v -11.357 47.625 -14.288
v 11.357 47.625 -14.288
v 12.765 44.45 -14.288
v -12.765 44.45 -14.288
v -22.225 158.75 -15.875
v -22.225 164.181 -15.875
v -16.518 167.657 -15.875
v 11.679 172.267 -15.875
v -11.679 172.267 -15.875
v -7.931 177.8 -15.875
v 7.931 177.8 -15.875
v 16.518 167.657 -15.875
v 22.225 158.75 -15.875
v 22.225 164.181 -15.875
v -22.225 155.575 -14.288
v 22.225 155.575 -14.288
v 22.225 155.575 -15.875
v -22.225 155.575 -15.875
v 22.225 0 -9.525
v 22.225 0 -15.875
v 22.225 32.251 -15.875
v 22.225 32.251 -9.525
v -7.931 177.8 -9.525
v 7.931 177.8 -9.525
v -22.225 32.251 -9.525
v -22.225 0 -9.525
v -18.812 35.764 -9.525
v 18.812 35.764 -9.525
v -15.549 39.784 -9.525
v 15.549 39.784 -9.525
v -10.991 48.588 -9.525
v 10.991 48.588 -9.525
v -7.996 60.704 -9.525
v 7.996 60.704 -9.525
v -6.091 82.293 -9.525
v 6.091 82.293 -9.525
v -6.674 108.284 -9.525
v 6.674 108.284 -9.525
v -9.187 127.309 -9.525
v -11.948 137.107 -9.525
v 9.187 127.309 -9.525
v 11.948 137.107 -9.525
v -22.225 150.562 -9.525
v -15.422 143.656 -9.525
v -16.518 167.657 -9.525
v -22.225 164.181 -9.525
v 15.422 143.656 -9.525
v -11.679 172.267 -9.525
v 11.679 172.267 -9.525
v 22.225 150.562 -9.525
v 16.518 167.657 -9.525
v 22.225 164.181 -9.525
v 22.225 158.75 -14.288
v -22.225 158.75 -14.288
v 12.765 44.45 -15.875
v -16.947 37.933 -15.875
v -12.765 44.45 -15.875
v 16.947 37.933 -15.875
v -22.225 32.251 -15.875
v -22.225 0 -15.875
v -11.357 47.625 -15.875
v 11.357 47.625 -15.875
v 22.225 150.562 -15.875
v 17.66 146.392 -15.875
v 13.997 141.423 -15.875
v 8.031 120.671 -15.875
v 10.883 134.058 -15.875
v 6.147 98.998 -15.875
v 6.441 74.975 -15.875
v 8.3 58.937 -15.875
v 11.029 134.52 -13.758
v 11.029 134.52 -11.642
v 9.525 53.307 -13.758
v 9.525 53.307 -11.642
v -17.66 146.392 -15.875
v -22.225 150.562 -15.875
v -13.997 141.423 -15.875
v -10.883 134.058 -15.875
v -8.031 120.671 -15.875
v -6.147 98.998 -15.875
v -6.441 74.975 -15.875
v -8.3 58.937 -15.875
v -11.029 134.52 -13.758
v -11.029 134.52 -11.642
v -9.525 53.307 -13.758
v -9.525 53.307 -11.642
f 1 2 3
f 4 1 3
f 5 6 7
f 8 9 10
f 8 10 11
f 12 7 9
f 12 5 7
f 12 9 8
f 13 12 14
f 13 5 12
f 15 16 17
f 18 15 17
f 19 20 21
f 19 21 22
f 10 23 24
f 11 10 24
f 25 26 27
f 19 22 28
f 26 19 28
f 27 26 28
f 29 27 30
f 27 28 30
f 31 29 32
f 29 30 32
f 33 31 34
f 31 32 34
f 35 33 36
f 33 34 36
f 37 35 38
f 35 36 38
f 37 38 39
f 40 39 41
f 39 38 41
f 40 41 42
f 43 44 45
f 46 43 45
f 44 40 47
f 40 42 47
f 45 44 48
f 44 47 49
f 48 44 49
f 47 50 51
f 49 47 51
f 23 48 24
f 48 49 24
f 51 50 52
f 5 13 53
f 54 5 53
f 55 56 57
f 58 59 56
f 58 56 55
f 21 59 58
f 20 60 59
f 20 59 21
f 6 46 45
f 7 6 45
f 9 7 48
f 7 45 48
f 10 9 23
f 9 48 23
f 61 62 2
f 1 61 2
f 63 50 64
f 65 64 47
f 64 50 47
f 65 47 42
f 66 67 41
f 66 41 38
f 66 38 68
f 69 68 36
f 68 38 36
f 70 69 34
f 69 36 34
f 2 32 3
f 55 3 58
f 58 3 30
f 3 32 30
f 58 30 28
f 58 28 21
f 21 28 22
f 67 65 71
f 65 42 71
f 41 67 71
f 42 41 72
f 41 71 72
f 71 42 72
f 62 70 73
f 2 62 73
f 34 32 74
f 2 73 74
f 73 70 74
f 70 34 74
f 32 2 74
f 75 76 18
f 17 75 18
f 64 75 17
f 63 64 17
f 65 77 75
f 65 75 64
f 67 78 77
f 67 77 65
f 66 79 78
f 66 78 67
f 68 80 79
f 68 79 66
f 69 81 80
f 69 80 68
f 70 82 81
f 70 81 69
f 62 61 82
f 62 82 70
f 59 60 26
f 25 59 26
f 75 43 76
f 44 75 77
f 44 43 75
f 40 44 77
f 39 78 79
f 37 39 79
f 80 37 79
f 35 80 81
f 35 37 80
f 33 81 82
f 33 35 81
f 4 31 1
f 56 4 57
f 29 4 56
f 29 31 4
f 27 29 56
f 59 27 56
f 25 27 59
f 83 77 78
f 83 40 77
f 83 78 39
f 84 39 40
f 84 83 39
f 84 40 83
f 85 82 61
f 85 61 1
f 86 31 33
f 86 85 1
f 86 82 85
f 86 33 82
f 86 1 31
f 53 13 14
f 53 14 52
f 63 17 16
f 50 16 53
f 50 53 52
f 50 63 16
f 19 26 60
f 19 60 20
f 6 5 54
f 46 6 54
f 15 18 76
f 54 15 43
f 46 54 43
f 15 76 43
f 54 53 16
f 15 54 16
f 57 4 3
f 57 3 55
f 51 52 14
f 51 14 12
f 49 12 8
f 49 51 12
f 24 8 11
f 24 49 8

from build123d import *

# Parameters (mm, degrees)
F0_W     = 44.45
F0_H     = 31.75
F1_DEPTH = 177.8
F3_DEPTH = 44.451
F4_W     = 177.8
F4_H     = 25.4
F5_DEPTH = 66.04
F7_DEPTH = 25.4
F9_DEPTH = 25.4


# Not quite as in the source:
# - a pattern or mirror of a feature is missing from the dataset's text; its kind, count and spacing are read off the source's solid


with BuildPart() as f1:
    # F0 (on Front) → F1 (new body)
    with BuildSketch(Plane.XZ):
        Rectangle(F0_W, F0_H)
    extrude(amount=-F1_DEPTH)

    # F2 (on face) → F3 (cut, through all)
    with BuildSketch(Plane.YZ.offset(22.225)):
        with BuildLine():
            ThreePointArc((46.0375, -14.2875), (44.9149679849, -14.7524679849), (44.45, -15.875))
            Line((44.45, -15.875), (47.625, -15.875))
            ThreePointArc((47.625, -15.875), (47.1600320151, -14.7524679849), (46.0375, -14.2875))
        make_face()
        with BuildLine():
            ThreePointArc((46.0375, -14.2875), (47.1600320151, -14.7524679849), (47.625, -15.875))
            Line((47.625, -15.875), (47.625, -14.2875))
            Line((47.625, -14.2875), (46.0375, -14.2875))
        make_face()
        with BuildLine():
            Line((44.45, -14.2875), (44.45, -15.875))
            ThreePointArc((44.45, -15.875), (44.9149679849, -14.7524679849), (46.0375, -14.2875))
            Line((46.0375, -14.2875), (44.45, -14.2875))
        make_face()
        with BuildLine():
            ThreePointArc((157.1625, -14.2875), (156.0399679849, -14.7524679849), (155.575, -15.875))
            Line((155.575, -15.875), (158.75, -15.875))
            ThreePointArc((158.75, -15.875), (158.2850320151, -14.7524679849), (157.1625, -14.2875))
        make_face()
        with BuildLine():
            ThreePointArc((157.1625, -14.2875), (158.2850320151, -14.7524679849), (158.75, -15.875))
            Line((158.75, -15.875), (158.75, -14.2875))
            Line((158.75, -14.2875), (157.1625, -14.2875))
        make_face()
        with BuildLine():
            Line((155.575, -14.2875), (155.575, -15.875))
            ThreePointArc((155.575, -15.875), (156.0399679849, -14.7524679849), (157.1625, -14.2875))
            Line((157.1625, -14.2875), (155.575, -14.2875))
        make_face()
    extrude(amount=-F3_DEPTH, mode=Mode.SUBTRACT)

    # F4 (on face) → F5 (cut)
    with BuildSketch(Plane.YZ.offset(22.225)):
        with Locations((88.9, 3.175)):
            Rectangle(F4_W, F4_H)
    extrude(amount=-F5_DEPTH, mode=Mode.SUBTRACT)

    # F6 (on face) → F7 (cut)
    with BuildSketch(Plane.XY.offset(-9.525)):
        with BuildLine():
            add(Edge.make_bspline(
                [(-22.225, 150.5618393421), (-18.0890147105, 147.097734562), (-5.5252210375, 136.5748978803), (-3.6345620333, 50.7939916857), (-17.3552404375, 37.108562276), (-22.225, 32.2513133287)],
                knots=[0, 0, 0, 0, 0.2404536555, 0.7304209045, 1, 1, 1, 1], degree=3))
            Line((-22.225, 150.5618393421), (-22.225, 32.2513133287))
        make_face()
        with BuildLine():
            Line((22.225, 32.2513133287), (22.225, 150.5618393421))
            add(Edge.make_bspline(
                [(22.225, 150.5618393421), (18.0890147105, 147.097734562), (5.5252210375, 136.5748978803), (3.6345620333, 50.7939916857), (17.3552404375, 37.108562276), (22.225, 32.2513133287)],
                knots=[0, 0, 0, 0, 0.2404536555, 0.7304209045, 1, 1, 1, 1], degree=3))
        make_face()
    extrude(amount=-F7_DEPTH, mode=Mode.SUBTRACT)

    # F8 (on face) → F9 (cut)
    with BuildSketch(Plane.XY.offset(-9.525)):
        with BuildLine():
            Line((-22.225, 177.8), (-22.225, 164.1809196711))
            ThreePointArc((-22.225, 164.1809196711), (-13.9748413511, 169.8326284901), (-7.9310080037, 177.8))
            Line((-7.9310080037, 177.8), (-22.225, 177.8))
        make_face()
    f9 = extrude(amount=-F9_DEPTH, mode=Mode.SUBTRACT)

    # F9_copies: F9 across plane
    add(f9.mirror(Plane(origin=(0, 0, 0), x_dir=(0, 0, 1), z_dir=(1, 0, 0))), mode=Mode.SUBTRACT)


solid = f1.part
